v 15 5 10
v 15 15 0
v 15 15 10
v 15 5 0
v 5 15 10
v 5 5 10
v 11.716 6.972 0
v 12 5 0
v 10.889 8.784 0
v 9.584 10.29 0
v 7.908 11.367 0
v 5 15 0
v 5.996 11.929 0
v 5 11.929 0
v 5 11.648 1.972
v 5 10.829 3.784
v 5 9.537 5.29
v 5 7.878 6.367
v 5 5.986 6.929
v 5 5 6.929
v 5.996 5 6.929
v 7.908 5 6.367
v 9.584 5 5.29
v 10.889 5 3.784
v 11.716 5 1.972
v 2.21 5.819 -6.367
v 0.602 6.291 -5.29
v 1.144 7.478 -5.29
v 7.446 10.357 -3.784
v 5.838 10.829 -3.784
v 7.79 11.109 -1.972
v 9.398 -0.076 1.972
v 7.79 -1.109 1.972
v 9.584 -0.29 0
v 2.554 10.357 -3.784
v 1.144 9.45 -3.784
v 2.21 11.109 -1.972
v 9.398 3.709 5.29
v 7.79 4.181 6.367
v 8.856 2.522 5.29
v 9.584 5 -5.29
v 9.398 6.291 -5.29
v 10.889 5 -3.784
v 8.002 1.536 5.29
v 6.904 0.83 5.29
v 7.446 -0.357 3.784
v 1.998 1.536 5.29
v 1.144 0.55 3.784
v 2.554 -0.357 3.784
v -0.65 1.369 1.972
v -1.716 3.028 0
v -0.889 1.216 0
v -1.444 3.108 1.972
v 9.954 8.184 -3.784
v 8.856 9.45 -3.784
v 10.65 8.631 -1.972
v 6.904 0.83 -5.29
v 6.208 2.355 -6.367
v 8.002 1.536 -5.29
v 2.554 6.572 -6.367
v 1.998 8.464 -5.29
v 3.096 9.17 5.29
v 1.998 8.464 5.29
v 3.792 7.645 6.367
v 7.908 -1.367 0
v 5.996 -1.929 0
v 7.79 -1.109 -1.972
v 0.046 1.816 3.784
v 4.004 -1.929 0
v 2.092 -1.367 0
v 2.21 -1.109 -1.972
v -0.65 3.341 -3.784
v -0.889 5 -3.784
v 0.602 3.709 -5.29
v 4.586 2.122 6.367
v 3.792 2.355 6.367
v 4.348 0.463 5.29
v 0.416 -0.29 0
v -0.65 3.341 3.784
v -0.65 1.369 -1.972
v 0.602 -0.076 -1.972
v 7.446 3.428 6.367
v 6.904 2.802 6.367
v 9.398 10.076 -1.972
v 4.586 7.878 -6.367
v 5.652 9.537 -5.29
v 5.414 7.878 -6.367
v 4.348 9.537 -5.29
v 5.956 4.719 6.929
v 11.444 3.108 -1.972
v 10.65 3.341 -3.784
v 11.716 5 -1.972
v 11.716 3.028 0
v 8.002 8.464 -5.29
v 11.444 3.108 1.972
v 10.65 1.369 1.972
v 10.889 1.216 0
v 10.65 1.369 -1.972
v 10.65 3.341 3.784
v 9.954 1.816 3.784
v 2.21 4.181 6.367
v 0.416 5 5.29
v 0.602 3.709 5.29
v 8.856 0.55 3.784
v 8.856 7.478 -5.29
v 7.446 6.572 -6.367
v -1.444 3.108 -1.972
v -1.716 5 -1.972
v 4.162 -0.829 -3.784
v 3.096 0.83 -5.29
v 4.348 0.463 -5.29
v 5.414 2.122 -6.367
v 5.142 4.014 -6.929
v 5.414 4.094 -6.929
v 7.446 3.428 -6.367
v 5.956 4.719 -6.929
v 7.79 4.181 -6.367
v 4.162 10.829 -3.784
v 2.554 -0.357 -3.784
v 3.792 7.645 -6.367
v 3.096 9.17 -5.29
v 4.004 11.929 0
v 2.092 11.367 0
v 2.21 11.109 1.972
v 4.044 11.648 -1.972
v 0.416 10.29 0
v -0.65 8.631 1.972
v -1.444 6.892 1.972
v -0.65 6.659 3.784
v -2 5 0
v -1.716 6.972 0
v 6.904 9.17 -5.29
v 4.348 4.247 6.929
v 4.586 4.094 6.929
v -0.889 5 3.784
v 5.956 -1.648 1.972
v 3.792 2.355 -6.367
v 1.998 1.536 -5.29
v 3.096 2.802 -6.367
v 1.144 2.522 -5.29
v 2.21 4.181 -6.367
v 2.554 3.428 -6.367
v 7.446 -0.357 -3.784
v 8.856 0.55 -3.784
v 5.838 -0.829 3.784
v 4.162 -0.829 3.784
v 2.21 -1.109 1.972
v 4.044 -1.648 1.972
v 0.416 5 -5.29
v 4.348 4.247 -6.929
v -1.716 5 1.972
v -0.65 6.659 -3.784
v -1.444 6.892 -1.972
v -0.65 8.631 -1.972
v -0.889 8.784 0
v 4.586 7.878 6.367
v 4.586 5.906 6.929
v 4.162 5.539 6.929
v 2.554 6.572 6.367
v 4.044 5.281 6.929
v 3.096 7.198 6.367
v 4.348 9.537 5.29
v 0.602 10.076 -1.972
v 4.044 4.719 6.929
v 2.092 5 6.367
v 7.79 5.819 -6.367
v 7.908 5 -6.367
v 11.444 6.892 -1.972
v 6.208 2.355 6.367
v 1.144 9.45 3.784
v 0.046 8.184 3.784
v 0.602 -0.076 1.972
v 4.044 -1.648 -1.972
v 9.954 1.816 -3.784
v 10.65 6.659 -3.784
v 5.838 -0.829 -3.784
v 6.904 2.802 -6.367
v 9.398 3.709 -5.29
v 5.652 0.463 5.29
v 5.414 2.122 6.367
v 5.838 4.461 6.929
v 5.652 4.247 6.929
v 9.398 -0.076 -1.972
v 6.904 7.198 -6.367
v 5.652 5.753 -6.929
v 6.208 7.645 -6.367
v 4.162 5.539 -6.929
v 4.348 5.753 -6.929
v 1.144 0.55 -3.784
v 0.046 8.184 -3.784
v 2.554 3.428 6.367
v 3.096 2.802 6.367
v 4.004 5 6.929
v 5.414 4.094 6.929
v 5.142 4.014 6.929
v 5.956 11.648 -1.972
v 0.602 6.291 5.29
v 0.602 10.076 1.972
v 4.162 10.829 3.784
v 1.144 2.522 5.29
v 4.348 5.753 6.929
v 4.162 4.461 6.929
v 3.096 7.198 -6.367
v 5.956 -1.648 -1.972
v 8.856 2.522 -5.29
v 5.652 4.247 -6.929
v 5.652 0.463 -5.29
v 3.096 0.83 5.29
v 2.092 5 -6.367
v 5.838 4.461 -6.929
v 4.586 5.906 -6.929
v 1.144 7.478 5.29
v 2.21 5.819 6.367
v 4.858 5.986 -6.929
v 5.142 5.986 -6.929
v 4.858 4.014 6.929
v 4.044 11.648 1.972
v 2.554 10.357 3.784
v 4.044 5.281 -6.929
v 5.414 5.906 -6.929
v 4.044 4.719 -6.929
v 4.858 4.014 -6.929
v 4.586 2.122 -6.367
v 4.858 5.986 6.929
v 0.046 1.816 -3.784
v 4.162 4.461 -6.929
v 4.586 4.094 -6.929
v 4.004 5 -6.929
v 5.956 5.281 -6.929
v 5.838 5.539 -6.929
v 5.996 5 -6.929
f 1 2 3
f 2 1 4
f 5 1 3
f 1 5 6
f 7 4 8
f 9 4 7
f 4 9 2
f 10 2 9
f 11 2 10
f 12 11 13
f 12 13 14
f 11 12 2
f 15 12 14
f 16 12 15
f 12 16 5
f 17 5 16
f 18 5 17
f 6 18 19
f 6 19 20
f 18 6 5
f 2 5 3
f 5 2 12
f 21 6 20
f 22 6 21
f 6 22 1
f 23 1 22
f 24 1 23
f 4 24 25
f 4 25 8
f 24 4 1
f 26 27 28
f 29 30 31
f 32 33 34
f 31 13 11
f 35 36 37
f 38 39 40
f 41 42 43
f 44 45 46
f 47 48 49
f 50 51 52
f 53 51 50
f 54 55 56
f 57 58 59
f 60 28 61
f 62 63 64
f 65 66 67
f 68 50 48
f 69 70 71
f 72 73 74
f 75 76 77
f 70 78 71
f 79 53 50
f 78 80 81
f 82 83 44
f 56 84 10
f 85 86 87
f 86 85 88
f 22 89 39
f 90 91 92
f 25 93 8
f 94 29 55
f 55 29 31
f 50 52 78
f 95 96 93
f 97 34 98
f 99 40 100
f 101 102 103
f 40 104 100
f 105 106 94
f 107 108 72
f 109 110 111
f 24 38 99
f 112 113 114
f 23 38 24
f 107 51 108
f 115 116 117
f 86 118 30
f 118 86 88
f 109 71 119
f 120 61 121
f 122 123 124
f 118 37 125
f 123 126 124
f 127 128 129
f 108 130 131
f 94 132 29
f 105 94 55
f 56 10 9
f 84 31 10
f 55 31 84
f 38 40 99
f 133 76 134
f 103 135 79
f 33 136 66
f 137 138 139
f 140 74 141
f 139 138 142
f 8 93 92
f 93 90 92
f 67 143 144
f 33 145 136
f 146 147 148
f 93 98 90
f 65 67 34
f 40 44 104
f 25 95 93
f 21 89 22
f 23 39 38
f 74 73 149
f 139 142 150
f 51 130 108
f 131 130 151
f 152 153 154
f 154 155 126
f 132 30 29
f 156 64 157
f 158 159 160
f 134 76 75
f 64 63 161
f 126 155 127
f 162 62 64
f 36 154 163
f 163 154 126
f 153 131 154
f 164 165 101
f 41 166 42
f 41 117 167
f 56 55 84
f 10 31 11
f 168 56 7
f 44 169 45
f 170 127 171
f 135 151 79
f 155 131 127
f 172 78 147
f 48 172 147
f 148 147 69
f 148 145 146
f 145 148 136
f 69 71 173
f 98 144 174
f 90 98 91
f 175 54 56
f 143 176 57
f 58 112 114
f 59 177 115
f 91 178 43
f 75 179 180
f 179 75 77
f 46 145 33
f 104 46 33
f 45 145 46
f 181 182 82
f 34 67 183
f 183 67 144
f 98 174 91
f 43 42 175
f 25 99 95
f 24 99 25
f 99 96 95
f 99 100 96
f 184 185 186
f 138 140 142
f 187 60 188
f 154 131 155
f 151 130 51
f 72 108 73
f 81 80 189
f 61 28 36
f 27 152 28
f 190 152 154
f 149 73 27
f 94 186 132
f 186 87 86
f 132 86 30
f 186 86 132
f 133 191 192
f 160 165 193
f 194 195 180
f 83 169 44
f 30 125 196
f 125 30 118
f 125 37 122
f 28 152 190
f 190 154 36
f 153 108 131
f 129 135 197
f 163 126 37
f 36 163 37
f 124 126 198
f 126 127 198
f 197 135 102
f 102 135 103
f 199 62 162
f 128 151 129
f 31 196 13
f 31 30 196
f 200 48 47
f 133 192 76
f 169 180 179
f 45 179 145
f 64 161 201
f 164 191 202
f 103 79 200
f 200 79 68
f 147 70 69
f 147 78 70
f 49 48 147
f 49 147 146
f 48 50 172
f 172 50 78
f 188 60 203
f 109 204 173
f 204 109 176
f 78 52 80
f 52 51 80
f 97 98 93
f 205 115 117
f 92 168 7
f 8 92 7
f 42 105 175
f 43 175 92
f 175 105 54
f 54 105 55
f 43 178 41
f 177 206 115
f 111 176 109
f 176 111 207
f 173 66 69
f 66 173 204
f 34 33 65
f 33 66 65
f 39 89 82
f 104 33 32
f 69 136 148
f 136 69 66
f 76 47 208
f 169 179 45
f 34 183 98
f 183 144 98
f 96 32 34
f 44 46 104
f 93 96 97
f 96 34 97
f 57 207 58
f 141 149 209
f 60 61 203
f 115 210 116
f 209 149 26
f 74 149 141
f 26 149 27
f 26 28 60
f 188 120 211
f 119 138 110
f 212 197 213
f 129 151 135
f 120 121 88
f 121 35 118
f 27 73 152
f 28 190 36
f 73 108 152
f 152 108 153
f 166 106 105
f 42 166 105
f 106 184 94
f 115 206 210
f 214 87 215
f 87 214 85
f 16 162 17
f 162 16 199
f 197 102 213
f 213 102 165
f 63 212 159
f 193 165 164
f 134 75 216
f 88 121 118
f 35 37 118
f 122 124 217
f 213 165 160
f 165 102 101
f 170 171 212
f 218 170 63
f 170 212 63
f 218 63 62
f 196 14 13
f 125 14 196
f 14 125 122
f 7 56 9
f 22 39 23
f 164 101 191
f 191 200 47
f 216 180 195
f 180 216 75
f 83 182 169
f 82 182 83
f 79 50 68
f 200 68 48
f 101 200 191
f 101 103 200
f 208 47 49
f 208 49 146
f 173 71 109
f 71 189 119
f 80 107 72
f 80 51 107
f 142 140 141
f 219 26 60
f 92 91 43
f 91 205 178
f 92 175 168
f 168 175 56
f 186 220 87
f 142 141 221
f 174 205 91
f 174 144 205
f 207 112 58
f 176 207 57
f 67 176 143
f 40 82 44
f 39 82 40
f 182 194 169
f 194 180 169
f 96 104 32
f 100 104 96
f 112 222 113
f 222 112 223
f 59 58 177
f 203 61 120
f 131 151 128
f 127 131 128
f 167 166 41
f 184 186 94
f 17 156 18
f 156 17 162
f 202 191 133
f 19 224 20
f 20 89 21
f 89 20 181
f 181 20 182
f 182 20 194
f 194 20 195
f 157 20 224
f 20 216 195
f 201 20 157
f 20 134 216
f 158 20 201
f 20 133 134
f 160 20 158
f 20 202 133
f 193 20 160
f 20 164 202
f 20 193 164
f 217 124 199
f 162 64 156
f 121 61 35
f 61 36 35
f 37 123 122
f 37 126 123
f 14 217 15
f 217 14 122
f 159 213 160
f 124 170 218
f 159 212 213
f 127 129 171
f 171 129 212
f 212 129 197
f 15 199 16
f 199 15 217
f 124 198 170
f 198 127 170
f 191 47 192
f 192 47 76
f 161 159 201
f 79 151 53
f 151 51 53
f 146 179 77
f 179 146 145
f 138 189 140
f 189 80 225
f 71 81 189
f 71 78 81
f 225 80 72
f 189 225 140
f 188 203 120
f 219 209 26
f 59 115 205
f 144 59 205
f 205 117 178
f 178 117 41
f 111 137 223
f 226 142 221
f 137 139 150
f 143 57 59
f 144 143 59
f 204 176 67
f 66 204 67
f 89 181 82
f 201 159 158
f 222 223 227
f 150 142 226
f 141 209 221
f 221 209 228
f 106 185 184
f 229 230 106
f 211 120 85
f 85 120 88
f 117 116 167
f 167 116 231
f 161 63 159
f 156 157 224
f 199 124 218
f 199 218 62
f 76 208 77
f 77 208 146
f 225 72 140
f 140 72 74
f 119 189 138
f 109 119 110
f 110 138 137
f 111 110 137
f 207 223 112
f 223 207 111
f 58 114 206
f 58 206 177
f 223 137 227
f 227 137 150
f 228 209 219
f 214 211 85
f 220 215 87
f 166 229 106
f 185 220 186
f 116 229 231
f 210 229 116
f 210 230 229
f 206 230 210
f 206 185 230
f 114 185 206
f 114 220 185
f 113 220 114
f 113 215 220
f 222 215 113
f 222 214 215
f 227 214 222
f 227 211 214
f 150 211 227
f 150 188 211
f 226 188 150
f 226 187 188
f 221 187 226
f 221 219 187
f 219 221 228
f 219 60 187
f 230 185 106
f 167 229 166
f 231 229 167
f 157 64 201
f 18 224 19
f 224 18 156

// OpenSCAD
color("green") translate([5, 5, 0]) union() {
    cube([10, 10, 10]);
    sphere(r = 7);
}
